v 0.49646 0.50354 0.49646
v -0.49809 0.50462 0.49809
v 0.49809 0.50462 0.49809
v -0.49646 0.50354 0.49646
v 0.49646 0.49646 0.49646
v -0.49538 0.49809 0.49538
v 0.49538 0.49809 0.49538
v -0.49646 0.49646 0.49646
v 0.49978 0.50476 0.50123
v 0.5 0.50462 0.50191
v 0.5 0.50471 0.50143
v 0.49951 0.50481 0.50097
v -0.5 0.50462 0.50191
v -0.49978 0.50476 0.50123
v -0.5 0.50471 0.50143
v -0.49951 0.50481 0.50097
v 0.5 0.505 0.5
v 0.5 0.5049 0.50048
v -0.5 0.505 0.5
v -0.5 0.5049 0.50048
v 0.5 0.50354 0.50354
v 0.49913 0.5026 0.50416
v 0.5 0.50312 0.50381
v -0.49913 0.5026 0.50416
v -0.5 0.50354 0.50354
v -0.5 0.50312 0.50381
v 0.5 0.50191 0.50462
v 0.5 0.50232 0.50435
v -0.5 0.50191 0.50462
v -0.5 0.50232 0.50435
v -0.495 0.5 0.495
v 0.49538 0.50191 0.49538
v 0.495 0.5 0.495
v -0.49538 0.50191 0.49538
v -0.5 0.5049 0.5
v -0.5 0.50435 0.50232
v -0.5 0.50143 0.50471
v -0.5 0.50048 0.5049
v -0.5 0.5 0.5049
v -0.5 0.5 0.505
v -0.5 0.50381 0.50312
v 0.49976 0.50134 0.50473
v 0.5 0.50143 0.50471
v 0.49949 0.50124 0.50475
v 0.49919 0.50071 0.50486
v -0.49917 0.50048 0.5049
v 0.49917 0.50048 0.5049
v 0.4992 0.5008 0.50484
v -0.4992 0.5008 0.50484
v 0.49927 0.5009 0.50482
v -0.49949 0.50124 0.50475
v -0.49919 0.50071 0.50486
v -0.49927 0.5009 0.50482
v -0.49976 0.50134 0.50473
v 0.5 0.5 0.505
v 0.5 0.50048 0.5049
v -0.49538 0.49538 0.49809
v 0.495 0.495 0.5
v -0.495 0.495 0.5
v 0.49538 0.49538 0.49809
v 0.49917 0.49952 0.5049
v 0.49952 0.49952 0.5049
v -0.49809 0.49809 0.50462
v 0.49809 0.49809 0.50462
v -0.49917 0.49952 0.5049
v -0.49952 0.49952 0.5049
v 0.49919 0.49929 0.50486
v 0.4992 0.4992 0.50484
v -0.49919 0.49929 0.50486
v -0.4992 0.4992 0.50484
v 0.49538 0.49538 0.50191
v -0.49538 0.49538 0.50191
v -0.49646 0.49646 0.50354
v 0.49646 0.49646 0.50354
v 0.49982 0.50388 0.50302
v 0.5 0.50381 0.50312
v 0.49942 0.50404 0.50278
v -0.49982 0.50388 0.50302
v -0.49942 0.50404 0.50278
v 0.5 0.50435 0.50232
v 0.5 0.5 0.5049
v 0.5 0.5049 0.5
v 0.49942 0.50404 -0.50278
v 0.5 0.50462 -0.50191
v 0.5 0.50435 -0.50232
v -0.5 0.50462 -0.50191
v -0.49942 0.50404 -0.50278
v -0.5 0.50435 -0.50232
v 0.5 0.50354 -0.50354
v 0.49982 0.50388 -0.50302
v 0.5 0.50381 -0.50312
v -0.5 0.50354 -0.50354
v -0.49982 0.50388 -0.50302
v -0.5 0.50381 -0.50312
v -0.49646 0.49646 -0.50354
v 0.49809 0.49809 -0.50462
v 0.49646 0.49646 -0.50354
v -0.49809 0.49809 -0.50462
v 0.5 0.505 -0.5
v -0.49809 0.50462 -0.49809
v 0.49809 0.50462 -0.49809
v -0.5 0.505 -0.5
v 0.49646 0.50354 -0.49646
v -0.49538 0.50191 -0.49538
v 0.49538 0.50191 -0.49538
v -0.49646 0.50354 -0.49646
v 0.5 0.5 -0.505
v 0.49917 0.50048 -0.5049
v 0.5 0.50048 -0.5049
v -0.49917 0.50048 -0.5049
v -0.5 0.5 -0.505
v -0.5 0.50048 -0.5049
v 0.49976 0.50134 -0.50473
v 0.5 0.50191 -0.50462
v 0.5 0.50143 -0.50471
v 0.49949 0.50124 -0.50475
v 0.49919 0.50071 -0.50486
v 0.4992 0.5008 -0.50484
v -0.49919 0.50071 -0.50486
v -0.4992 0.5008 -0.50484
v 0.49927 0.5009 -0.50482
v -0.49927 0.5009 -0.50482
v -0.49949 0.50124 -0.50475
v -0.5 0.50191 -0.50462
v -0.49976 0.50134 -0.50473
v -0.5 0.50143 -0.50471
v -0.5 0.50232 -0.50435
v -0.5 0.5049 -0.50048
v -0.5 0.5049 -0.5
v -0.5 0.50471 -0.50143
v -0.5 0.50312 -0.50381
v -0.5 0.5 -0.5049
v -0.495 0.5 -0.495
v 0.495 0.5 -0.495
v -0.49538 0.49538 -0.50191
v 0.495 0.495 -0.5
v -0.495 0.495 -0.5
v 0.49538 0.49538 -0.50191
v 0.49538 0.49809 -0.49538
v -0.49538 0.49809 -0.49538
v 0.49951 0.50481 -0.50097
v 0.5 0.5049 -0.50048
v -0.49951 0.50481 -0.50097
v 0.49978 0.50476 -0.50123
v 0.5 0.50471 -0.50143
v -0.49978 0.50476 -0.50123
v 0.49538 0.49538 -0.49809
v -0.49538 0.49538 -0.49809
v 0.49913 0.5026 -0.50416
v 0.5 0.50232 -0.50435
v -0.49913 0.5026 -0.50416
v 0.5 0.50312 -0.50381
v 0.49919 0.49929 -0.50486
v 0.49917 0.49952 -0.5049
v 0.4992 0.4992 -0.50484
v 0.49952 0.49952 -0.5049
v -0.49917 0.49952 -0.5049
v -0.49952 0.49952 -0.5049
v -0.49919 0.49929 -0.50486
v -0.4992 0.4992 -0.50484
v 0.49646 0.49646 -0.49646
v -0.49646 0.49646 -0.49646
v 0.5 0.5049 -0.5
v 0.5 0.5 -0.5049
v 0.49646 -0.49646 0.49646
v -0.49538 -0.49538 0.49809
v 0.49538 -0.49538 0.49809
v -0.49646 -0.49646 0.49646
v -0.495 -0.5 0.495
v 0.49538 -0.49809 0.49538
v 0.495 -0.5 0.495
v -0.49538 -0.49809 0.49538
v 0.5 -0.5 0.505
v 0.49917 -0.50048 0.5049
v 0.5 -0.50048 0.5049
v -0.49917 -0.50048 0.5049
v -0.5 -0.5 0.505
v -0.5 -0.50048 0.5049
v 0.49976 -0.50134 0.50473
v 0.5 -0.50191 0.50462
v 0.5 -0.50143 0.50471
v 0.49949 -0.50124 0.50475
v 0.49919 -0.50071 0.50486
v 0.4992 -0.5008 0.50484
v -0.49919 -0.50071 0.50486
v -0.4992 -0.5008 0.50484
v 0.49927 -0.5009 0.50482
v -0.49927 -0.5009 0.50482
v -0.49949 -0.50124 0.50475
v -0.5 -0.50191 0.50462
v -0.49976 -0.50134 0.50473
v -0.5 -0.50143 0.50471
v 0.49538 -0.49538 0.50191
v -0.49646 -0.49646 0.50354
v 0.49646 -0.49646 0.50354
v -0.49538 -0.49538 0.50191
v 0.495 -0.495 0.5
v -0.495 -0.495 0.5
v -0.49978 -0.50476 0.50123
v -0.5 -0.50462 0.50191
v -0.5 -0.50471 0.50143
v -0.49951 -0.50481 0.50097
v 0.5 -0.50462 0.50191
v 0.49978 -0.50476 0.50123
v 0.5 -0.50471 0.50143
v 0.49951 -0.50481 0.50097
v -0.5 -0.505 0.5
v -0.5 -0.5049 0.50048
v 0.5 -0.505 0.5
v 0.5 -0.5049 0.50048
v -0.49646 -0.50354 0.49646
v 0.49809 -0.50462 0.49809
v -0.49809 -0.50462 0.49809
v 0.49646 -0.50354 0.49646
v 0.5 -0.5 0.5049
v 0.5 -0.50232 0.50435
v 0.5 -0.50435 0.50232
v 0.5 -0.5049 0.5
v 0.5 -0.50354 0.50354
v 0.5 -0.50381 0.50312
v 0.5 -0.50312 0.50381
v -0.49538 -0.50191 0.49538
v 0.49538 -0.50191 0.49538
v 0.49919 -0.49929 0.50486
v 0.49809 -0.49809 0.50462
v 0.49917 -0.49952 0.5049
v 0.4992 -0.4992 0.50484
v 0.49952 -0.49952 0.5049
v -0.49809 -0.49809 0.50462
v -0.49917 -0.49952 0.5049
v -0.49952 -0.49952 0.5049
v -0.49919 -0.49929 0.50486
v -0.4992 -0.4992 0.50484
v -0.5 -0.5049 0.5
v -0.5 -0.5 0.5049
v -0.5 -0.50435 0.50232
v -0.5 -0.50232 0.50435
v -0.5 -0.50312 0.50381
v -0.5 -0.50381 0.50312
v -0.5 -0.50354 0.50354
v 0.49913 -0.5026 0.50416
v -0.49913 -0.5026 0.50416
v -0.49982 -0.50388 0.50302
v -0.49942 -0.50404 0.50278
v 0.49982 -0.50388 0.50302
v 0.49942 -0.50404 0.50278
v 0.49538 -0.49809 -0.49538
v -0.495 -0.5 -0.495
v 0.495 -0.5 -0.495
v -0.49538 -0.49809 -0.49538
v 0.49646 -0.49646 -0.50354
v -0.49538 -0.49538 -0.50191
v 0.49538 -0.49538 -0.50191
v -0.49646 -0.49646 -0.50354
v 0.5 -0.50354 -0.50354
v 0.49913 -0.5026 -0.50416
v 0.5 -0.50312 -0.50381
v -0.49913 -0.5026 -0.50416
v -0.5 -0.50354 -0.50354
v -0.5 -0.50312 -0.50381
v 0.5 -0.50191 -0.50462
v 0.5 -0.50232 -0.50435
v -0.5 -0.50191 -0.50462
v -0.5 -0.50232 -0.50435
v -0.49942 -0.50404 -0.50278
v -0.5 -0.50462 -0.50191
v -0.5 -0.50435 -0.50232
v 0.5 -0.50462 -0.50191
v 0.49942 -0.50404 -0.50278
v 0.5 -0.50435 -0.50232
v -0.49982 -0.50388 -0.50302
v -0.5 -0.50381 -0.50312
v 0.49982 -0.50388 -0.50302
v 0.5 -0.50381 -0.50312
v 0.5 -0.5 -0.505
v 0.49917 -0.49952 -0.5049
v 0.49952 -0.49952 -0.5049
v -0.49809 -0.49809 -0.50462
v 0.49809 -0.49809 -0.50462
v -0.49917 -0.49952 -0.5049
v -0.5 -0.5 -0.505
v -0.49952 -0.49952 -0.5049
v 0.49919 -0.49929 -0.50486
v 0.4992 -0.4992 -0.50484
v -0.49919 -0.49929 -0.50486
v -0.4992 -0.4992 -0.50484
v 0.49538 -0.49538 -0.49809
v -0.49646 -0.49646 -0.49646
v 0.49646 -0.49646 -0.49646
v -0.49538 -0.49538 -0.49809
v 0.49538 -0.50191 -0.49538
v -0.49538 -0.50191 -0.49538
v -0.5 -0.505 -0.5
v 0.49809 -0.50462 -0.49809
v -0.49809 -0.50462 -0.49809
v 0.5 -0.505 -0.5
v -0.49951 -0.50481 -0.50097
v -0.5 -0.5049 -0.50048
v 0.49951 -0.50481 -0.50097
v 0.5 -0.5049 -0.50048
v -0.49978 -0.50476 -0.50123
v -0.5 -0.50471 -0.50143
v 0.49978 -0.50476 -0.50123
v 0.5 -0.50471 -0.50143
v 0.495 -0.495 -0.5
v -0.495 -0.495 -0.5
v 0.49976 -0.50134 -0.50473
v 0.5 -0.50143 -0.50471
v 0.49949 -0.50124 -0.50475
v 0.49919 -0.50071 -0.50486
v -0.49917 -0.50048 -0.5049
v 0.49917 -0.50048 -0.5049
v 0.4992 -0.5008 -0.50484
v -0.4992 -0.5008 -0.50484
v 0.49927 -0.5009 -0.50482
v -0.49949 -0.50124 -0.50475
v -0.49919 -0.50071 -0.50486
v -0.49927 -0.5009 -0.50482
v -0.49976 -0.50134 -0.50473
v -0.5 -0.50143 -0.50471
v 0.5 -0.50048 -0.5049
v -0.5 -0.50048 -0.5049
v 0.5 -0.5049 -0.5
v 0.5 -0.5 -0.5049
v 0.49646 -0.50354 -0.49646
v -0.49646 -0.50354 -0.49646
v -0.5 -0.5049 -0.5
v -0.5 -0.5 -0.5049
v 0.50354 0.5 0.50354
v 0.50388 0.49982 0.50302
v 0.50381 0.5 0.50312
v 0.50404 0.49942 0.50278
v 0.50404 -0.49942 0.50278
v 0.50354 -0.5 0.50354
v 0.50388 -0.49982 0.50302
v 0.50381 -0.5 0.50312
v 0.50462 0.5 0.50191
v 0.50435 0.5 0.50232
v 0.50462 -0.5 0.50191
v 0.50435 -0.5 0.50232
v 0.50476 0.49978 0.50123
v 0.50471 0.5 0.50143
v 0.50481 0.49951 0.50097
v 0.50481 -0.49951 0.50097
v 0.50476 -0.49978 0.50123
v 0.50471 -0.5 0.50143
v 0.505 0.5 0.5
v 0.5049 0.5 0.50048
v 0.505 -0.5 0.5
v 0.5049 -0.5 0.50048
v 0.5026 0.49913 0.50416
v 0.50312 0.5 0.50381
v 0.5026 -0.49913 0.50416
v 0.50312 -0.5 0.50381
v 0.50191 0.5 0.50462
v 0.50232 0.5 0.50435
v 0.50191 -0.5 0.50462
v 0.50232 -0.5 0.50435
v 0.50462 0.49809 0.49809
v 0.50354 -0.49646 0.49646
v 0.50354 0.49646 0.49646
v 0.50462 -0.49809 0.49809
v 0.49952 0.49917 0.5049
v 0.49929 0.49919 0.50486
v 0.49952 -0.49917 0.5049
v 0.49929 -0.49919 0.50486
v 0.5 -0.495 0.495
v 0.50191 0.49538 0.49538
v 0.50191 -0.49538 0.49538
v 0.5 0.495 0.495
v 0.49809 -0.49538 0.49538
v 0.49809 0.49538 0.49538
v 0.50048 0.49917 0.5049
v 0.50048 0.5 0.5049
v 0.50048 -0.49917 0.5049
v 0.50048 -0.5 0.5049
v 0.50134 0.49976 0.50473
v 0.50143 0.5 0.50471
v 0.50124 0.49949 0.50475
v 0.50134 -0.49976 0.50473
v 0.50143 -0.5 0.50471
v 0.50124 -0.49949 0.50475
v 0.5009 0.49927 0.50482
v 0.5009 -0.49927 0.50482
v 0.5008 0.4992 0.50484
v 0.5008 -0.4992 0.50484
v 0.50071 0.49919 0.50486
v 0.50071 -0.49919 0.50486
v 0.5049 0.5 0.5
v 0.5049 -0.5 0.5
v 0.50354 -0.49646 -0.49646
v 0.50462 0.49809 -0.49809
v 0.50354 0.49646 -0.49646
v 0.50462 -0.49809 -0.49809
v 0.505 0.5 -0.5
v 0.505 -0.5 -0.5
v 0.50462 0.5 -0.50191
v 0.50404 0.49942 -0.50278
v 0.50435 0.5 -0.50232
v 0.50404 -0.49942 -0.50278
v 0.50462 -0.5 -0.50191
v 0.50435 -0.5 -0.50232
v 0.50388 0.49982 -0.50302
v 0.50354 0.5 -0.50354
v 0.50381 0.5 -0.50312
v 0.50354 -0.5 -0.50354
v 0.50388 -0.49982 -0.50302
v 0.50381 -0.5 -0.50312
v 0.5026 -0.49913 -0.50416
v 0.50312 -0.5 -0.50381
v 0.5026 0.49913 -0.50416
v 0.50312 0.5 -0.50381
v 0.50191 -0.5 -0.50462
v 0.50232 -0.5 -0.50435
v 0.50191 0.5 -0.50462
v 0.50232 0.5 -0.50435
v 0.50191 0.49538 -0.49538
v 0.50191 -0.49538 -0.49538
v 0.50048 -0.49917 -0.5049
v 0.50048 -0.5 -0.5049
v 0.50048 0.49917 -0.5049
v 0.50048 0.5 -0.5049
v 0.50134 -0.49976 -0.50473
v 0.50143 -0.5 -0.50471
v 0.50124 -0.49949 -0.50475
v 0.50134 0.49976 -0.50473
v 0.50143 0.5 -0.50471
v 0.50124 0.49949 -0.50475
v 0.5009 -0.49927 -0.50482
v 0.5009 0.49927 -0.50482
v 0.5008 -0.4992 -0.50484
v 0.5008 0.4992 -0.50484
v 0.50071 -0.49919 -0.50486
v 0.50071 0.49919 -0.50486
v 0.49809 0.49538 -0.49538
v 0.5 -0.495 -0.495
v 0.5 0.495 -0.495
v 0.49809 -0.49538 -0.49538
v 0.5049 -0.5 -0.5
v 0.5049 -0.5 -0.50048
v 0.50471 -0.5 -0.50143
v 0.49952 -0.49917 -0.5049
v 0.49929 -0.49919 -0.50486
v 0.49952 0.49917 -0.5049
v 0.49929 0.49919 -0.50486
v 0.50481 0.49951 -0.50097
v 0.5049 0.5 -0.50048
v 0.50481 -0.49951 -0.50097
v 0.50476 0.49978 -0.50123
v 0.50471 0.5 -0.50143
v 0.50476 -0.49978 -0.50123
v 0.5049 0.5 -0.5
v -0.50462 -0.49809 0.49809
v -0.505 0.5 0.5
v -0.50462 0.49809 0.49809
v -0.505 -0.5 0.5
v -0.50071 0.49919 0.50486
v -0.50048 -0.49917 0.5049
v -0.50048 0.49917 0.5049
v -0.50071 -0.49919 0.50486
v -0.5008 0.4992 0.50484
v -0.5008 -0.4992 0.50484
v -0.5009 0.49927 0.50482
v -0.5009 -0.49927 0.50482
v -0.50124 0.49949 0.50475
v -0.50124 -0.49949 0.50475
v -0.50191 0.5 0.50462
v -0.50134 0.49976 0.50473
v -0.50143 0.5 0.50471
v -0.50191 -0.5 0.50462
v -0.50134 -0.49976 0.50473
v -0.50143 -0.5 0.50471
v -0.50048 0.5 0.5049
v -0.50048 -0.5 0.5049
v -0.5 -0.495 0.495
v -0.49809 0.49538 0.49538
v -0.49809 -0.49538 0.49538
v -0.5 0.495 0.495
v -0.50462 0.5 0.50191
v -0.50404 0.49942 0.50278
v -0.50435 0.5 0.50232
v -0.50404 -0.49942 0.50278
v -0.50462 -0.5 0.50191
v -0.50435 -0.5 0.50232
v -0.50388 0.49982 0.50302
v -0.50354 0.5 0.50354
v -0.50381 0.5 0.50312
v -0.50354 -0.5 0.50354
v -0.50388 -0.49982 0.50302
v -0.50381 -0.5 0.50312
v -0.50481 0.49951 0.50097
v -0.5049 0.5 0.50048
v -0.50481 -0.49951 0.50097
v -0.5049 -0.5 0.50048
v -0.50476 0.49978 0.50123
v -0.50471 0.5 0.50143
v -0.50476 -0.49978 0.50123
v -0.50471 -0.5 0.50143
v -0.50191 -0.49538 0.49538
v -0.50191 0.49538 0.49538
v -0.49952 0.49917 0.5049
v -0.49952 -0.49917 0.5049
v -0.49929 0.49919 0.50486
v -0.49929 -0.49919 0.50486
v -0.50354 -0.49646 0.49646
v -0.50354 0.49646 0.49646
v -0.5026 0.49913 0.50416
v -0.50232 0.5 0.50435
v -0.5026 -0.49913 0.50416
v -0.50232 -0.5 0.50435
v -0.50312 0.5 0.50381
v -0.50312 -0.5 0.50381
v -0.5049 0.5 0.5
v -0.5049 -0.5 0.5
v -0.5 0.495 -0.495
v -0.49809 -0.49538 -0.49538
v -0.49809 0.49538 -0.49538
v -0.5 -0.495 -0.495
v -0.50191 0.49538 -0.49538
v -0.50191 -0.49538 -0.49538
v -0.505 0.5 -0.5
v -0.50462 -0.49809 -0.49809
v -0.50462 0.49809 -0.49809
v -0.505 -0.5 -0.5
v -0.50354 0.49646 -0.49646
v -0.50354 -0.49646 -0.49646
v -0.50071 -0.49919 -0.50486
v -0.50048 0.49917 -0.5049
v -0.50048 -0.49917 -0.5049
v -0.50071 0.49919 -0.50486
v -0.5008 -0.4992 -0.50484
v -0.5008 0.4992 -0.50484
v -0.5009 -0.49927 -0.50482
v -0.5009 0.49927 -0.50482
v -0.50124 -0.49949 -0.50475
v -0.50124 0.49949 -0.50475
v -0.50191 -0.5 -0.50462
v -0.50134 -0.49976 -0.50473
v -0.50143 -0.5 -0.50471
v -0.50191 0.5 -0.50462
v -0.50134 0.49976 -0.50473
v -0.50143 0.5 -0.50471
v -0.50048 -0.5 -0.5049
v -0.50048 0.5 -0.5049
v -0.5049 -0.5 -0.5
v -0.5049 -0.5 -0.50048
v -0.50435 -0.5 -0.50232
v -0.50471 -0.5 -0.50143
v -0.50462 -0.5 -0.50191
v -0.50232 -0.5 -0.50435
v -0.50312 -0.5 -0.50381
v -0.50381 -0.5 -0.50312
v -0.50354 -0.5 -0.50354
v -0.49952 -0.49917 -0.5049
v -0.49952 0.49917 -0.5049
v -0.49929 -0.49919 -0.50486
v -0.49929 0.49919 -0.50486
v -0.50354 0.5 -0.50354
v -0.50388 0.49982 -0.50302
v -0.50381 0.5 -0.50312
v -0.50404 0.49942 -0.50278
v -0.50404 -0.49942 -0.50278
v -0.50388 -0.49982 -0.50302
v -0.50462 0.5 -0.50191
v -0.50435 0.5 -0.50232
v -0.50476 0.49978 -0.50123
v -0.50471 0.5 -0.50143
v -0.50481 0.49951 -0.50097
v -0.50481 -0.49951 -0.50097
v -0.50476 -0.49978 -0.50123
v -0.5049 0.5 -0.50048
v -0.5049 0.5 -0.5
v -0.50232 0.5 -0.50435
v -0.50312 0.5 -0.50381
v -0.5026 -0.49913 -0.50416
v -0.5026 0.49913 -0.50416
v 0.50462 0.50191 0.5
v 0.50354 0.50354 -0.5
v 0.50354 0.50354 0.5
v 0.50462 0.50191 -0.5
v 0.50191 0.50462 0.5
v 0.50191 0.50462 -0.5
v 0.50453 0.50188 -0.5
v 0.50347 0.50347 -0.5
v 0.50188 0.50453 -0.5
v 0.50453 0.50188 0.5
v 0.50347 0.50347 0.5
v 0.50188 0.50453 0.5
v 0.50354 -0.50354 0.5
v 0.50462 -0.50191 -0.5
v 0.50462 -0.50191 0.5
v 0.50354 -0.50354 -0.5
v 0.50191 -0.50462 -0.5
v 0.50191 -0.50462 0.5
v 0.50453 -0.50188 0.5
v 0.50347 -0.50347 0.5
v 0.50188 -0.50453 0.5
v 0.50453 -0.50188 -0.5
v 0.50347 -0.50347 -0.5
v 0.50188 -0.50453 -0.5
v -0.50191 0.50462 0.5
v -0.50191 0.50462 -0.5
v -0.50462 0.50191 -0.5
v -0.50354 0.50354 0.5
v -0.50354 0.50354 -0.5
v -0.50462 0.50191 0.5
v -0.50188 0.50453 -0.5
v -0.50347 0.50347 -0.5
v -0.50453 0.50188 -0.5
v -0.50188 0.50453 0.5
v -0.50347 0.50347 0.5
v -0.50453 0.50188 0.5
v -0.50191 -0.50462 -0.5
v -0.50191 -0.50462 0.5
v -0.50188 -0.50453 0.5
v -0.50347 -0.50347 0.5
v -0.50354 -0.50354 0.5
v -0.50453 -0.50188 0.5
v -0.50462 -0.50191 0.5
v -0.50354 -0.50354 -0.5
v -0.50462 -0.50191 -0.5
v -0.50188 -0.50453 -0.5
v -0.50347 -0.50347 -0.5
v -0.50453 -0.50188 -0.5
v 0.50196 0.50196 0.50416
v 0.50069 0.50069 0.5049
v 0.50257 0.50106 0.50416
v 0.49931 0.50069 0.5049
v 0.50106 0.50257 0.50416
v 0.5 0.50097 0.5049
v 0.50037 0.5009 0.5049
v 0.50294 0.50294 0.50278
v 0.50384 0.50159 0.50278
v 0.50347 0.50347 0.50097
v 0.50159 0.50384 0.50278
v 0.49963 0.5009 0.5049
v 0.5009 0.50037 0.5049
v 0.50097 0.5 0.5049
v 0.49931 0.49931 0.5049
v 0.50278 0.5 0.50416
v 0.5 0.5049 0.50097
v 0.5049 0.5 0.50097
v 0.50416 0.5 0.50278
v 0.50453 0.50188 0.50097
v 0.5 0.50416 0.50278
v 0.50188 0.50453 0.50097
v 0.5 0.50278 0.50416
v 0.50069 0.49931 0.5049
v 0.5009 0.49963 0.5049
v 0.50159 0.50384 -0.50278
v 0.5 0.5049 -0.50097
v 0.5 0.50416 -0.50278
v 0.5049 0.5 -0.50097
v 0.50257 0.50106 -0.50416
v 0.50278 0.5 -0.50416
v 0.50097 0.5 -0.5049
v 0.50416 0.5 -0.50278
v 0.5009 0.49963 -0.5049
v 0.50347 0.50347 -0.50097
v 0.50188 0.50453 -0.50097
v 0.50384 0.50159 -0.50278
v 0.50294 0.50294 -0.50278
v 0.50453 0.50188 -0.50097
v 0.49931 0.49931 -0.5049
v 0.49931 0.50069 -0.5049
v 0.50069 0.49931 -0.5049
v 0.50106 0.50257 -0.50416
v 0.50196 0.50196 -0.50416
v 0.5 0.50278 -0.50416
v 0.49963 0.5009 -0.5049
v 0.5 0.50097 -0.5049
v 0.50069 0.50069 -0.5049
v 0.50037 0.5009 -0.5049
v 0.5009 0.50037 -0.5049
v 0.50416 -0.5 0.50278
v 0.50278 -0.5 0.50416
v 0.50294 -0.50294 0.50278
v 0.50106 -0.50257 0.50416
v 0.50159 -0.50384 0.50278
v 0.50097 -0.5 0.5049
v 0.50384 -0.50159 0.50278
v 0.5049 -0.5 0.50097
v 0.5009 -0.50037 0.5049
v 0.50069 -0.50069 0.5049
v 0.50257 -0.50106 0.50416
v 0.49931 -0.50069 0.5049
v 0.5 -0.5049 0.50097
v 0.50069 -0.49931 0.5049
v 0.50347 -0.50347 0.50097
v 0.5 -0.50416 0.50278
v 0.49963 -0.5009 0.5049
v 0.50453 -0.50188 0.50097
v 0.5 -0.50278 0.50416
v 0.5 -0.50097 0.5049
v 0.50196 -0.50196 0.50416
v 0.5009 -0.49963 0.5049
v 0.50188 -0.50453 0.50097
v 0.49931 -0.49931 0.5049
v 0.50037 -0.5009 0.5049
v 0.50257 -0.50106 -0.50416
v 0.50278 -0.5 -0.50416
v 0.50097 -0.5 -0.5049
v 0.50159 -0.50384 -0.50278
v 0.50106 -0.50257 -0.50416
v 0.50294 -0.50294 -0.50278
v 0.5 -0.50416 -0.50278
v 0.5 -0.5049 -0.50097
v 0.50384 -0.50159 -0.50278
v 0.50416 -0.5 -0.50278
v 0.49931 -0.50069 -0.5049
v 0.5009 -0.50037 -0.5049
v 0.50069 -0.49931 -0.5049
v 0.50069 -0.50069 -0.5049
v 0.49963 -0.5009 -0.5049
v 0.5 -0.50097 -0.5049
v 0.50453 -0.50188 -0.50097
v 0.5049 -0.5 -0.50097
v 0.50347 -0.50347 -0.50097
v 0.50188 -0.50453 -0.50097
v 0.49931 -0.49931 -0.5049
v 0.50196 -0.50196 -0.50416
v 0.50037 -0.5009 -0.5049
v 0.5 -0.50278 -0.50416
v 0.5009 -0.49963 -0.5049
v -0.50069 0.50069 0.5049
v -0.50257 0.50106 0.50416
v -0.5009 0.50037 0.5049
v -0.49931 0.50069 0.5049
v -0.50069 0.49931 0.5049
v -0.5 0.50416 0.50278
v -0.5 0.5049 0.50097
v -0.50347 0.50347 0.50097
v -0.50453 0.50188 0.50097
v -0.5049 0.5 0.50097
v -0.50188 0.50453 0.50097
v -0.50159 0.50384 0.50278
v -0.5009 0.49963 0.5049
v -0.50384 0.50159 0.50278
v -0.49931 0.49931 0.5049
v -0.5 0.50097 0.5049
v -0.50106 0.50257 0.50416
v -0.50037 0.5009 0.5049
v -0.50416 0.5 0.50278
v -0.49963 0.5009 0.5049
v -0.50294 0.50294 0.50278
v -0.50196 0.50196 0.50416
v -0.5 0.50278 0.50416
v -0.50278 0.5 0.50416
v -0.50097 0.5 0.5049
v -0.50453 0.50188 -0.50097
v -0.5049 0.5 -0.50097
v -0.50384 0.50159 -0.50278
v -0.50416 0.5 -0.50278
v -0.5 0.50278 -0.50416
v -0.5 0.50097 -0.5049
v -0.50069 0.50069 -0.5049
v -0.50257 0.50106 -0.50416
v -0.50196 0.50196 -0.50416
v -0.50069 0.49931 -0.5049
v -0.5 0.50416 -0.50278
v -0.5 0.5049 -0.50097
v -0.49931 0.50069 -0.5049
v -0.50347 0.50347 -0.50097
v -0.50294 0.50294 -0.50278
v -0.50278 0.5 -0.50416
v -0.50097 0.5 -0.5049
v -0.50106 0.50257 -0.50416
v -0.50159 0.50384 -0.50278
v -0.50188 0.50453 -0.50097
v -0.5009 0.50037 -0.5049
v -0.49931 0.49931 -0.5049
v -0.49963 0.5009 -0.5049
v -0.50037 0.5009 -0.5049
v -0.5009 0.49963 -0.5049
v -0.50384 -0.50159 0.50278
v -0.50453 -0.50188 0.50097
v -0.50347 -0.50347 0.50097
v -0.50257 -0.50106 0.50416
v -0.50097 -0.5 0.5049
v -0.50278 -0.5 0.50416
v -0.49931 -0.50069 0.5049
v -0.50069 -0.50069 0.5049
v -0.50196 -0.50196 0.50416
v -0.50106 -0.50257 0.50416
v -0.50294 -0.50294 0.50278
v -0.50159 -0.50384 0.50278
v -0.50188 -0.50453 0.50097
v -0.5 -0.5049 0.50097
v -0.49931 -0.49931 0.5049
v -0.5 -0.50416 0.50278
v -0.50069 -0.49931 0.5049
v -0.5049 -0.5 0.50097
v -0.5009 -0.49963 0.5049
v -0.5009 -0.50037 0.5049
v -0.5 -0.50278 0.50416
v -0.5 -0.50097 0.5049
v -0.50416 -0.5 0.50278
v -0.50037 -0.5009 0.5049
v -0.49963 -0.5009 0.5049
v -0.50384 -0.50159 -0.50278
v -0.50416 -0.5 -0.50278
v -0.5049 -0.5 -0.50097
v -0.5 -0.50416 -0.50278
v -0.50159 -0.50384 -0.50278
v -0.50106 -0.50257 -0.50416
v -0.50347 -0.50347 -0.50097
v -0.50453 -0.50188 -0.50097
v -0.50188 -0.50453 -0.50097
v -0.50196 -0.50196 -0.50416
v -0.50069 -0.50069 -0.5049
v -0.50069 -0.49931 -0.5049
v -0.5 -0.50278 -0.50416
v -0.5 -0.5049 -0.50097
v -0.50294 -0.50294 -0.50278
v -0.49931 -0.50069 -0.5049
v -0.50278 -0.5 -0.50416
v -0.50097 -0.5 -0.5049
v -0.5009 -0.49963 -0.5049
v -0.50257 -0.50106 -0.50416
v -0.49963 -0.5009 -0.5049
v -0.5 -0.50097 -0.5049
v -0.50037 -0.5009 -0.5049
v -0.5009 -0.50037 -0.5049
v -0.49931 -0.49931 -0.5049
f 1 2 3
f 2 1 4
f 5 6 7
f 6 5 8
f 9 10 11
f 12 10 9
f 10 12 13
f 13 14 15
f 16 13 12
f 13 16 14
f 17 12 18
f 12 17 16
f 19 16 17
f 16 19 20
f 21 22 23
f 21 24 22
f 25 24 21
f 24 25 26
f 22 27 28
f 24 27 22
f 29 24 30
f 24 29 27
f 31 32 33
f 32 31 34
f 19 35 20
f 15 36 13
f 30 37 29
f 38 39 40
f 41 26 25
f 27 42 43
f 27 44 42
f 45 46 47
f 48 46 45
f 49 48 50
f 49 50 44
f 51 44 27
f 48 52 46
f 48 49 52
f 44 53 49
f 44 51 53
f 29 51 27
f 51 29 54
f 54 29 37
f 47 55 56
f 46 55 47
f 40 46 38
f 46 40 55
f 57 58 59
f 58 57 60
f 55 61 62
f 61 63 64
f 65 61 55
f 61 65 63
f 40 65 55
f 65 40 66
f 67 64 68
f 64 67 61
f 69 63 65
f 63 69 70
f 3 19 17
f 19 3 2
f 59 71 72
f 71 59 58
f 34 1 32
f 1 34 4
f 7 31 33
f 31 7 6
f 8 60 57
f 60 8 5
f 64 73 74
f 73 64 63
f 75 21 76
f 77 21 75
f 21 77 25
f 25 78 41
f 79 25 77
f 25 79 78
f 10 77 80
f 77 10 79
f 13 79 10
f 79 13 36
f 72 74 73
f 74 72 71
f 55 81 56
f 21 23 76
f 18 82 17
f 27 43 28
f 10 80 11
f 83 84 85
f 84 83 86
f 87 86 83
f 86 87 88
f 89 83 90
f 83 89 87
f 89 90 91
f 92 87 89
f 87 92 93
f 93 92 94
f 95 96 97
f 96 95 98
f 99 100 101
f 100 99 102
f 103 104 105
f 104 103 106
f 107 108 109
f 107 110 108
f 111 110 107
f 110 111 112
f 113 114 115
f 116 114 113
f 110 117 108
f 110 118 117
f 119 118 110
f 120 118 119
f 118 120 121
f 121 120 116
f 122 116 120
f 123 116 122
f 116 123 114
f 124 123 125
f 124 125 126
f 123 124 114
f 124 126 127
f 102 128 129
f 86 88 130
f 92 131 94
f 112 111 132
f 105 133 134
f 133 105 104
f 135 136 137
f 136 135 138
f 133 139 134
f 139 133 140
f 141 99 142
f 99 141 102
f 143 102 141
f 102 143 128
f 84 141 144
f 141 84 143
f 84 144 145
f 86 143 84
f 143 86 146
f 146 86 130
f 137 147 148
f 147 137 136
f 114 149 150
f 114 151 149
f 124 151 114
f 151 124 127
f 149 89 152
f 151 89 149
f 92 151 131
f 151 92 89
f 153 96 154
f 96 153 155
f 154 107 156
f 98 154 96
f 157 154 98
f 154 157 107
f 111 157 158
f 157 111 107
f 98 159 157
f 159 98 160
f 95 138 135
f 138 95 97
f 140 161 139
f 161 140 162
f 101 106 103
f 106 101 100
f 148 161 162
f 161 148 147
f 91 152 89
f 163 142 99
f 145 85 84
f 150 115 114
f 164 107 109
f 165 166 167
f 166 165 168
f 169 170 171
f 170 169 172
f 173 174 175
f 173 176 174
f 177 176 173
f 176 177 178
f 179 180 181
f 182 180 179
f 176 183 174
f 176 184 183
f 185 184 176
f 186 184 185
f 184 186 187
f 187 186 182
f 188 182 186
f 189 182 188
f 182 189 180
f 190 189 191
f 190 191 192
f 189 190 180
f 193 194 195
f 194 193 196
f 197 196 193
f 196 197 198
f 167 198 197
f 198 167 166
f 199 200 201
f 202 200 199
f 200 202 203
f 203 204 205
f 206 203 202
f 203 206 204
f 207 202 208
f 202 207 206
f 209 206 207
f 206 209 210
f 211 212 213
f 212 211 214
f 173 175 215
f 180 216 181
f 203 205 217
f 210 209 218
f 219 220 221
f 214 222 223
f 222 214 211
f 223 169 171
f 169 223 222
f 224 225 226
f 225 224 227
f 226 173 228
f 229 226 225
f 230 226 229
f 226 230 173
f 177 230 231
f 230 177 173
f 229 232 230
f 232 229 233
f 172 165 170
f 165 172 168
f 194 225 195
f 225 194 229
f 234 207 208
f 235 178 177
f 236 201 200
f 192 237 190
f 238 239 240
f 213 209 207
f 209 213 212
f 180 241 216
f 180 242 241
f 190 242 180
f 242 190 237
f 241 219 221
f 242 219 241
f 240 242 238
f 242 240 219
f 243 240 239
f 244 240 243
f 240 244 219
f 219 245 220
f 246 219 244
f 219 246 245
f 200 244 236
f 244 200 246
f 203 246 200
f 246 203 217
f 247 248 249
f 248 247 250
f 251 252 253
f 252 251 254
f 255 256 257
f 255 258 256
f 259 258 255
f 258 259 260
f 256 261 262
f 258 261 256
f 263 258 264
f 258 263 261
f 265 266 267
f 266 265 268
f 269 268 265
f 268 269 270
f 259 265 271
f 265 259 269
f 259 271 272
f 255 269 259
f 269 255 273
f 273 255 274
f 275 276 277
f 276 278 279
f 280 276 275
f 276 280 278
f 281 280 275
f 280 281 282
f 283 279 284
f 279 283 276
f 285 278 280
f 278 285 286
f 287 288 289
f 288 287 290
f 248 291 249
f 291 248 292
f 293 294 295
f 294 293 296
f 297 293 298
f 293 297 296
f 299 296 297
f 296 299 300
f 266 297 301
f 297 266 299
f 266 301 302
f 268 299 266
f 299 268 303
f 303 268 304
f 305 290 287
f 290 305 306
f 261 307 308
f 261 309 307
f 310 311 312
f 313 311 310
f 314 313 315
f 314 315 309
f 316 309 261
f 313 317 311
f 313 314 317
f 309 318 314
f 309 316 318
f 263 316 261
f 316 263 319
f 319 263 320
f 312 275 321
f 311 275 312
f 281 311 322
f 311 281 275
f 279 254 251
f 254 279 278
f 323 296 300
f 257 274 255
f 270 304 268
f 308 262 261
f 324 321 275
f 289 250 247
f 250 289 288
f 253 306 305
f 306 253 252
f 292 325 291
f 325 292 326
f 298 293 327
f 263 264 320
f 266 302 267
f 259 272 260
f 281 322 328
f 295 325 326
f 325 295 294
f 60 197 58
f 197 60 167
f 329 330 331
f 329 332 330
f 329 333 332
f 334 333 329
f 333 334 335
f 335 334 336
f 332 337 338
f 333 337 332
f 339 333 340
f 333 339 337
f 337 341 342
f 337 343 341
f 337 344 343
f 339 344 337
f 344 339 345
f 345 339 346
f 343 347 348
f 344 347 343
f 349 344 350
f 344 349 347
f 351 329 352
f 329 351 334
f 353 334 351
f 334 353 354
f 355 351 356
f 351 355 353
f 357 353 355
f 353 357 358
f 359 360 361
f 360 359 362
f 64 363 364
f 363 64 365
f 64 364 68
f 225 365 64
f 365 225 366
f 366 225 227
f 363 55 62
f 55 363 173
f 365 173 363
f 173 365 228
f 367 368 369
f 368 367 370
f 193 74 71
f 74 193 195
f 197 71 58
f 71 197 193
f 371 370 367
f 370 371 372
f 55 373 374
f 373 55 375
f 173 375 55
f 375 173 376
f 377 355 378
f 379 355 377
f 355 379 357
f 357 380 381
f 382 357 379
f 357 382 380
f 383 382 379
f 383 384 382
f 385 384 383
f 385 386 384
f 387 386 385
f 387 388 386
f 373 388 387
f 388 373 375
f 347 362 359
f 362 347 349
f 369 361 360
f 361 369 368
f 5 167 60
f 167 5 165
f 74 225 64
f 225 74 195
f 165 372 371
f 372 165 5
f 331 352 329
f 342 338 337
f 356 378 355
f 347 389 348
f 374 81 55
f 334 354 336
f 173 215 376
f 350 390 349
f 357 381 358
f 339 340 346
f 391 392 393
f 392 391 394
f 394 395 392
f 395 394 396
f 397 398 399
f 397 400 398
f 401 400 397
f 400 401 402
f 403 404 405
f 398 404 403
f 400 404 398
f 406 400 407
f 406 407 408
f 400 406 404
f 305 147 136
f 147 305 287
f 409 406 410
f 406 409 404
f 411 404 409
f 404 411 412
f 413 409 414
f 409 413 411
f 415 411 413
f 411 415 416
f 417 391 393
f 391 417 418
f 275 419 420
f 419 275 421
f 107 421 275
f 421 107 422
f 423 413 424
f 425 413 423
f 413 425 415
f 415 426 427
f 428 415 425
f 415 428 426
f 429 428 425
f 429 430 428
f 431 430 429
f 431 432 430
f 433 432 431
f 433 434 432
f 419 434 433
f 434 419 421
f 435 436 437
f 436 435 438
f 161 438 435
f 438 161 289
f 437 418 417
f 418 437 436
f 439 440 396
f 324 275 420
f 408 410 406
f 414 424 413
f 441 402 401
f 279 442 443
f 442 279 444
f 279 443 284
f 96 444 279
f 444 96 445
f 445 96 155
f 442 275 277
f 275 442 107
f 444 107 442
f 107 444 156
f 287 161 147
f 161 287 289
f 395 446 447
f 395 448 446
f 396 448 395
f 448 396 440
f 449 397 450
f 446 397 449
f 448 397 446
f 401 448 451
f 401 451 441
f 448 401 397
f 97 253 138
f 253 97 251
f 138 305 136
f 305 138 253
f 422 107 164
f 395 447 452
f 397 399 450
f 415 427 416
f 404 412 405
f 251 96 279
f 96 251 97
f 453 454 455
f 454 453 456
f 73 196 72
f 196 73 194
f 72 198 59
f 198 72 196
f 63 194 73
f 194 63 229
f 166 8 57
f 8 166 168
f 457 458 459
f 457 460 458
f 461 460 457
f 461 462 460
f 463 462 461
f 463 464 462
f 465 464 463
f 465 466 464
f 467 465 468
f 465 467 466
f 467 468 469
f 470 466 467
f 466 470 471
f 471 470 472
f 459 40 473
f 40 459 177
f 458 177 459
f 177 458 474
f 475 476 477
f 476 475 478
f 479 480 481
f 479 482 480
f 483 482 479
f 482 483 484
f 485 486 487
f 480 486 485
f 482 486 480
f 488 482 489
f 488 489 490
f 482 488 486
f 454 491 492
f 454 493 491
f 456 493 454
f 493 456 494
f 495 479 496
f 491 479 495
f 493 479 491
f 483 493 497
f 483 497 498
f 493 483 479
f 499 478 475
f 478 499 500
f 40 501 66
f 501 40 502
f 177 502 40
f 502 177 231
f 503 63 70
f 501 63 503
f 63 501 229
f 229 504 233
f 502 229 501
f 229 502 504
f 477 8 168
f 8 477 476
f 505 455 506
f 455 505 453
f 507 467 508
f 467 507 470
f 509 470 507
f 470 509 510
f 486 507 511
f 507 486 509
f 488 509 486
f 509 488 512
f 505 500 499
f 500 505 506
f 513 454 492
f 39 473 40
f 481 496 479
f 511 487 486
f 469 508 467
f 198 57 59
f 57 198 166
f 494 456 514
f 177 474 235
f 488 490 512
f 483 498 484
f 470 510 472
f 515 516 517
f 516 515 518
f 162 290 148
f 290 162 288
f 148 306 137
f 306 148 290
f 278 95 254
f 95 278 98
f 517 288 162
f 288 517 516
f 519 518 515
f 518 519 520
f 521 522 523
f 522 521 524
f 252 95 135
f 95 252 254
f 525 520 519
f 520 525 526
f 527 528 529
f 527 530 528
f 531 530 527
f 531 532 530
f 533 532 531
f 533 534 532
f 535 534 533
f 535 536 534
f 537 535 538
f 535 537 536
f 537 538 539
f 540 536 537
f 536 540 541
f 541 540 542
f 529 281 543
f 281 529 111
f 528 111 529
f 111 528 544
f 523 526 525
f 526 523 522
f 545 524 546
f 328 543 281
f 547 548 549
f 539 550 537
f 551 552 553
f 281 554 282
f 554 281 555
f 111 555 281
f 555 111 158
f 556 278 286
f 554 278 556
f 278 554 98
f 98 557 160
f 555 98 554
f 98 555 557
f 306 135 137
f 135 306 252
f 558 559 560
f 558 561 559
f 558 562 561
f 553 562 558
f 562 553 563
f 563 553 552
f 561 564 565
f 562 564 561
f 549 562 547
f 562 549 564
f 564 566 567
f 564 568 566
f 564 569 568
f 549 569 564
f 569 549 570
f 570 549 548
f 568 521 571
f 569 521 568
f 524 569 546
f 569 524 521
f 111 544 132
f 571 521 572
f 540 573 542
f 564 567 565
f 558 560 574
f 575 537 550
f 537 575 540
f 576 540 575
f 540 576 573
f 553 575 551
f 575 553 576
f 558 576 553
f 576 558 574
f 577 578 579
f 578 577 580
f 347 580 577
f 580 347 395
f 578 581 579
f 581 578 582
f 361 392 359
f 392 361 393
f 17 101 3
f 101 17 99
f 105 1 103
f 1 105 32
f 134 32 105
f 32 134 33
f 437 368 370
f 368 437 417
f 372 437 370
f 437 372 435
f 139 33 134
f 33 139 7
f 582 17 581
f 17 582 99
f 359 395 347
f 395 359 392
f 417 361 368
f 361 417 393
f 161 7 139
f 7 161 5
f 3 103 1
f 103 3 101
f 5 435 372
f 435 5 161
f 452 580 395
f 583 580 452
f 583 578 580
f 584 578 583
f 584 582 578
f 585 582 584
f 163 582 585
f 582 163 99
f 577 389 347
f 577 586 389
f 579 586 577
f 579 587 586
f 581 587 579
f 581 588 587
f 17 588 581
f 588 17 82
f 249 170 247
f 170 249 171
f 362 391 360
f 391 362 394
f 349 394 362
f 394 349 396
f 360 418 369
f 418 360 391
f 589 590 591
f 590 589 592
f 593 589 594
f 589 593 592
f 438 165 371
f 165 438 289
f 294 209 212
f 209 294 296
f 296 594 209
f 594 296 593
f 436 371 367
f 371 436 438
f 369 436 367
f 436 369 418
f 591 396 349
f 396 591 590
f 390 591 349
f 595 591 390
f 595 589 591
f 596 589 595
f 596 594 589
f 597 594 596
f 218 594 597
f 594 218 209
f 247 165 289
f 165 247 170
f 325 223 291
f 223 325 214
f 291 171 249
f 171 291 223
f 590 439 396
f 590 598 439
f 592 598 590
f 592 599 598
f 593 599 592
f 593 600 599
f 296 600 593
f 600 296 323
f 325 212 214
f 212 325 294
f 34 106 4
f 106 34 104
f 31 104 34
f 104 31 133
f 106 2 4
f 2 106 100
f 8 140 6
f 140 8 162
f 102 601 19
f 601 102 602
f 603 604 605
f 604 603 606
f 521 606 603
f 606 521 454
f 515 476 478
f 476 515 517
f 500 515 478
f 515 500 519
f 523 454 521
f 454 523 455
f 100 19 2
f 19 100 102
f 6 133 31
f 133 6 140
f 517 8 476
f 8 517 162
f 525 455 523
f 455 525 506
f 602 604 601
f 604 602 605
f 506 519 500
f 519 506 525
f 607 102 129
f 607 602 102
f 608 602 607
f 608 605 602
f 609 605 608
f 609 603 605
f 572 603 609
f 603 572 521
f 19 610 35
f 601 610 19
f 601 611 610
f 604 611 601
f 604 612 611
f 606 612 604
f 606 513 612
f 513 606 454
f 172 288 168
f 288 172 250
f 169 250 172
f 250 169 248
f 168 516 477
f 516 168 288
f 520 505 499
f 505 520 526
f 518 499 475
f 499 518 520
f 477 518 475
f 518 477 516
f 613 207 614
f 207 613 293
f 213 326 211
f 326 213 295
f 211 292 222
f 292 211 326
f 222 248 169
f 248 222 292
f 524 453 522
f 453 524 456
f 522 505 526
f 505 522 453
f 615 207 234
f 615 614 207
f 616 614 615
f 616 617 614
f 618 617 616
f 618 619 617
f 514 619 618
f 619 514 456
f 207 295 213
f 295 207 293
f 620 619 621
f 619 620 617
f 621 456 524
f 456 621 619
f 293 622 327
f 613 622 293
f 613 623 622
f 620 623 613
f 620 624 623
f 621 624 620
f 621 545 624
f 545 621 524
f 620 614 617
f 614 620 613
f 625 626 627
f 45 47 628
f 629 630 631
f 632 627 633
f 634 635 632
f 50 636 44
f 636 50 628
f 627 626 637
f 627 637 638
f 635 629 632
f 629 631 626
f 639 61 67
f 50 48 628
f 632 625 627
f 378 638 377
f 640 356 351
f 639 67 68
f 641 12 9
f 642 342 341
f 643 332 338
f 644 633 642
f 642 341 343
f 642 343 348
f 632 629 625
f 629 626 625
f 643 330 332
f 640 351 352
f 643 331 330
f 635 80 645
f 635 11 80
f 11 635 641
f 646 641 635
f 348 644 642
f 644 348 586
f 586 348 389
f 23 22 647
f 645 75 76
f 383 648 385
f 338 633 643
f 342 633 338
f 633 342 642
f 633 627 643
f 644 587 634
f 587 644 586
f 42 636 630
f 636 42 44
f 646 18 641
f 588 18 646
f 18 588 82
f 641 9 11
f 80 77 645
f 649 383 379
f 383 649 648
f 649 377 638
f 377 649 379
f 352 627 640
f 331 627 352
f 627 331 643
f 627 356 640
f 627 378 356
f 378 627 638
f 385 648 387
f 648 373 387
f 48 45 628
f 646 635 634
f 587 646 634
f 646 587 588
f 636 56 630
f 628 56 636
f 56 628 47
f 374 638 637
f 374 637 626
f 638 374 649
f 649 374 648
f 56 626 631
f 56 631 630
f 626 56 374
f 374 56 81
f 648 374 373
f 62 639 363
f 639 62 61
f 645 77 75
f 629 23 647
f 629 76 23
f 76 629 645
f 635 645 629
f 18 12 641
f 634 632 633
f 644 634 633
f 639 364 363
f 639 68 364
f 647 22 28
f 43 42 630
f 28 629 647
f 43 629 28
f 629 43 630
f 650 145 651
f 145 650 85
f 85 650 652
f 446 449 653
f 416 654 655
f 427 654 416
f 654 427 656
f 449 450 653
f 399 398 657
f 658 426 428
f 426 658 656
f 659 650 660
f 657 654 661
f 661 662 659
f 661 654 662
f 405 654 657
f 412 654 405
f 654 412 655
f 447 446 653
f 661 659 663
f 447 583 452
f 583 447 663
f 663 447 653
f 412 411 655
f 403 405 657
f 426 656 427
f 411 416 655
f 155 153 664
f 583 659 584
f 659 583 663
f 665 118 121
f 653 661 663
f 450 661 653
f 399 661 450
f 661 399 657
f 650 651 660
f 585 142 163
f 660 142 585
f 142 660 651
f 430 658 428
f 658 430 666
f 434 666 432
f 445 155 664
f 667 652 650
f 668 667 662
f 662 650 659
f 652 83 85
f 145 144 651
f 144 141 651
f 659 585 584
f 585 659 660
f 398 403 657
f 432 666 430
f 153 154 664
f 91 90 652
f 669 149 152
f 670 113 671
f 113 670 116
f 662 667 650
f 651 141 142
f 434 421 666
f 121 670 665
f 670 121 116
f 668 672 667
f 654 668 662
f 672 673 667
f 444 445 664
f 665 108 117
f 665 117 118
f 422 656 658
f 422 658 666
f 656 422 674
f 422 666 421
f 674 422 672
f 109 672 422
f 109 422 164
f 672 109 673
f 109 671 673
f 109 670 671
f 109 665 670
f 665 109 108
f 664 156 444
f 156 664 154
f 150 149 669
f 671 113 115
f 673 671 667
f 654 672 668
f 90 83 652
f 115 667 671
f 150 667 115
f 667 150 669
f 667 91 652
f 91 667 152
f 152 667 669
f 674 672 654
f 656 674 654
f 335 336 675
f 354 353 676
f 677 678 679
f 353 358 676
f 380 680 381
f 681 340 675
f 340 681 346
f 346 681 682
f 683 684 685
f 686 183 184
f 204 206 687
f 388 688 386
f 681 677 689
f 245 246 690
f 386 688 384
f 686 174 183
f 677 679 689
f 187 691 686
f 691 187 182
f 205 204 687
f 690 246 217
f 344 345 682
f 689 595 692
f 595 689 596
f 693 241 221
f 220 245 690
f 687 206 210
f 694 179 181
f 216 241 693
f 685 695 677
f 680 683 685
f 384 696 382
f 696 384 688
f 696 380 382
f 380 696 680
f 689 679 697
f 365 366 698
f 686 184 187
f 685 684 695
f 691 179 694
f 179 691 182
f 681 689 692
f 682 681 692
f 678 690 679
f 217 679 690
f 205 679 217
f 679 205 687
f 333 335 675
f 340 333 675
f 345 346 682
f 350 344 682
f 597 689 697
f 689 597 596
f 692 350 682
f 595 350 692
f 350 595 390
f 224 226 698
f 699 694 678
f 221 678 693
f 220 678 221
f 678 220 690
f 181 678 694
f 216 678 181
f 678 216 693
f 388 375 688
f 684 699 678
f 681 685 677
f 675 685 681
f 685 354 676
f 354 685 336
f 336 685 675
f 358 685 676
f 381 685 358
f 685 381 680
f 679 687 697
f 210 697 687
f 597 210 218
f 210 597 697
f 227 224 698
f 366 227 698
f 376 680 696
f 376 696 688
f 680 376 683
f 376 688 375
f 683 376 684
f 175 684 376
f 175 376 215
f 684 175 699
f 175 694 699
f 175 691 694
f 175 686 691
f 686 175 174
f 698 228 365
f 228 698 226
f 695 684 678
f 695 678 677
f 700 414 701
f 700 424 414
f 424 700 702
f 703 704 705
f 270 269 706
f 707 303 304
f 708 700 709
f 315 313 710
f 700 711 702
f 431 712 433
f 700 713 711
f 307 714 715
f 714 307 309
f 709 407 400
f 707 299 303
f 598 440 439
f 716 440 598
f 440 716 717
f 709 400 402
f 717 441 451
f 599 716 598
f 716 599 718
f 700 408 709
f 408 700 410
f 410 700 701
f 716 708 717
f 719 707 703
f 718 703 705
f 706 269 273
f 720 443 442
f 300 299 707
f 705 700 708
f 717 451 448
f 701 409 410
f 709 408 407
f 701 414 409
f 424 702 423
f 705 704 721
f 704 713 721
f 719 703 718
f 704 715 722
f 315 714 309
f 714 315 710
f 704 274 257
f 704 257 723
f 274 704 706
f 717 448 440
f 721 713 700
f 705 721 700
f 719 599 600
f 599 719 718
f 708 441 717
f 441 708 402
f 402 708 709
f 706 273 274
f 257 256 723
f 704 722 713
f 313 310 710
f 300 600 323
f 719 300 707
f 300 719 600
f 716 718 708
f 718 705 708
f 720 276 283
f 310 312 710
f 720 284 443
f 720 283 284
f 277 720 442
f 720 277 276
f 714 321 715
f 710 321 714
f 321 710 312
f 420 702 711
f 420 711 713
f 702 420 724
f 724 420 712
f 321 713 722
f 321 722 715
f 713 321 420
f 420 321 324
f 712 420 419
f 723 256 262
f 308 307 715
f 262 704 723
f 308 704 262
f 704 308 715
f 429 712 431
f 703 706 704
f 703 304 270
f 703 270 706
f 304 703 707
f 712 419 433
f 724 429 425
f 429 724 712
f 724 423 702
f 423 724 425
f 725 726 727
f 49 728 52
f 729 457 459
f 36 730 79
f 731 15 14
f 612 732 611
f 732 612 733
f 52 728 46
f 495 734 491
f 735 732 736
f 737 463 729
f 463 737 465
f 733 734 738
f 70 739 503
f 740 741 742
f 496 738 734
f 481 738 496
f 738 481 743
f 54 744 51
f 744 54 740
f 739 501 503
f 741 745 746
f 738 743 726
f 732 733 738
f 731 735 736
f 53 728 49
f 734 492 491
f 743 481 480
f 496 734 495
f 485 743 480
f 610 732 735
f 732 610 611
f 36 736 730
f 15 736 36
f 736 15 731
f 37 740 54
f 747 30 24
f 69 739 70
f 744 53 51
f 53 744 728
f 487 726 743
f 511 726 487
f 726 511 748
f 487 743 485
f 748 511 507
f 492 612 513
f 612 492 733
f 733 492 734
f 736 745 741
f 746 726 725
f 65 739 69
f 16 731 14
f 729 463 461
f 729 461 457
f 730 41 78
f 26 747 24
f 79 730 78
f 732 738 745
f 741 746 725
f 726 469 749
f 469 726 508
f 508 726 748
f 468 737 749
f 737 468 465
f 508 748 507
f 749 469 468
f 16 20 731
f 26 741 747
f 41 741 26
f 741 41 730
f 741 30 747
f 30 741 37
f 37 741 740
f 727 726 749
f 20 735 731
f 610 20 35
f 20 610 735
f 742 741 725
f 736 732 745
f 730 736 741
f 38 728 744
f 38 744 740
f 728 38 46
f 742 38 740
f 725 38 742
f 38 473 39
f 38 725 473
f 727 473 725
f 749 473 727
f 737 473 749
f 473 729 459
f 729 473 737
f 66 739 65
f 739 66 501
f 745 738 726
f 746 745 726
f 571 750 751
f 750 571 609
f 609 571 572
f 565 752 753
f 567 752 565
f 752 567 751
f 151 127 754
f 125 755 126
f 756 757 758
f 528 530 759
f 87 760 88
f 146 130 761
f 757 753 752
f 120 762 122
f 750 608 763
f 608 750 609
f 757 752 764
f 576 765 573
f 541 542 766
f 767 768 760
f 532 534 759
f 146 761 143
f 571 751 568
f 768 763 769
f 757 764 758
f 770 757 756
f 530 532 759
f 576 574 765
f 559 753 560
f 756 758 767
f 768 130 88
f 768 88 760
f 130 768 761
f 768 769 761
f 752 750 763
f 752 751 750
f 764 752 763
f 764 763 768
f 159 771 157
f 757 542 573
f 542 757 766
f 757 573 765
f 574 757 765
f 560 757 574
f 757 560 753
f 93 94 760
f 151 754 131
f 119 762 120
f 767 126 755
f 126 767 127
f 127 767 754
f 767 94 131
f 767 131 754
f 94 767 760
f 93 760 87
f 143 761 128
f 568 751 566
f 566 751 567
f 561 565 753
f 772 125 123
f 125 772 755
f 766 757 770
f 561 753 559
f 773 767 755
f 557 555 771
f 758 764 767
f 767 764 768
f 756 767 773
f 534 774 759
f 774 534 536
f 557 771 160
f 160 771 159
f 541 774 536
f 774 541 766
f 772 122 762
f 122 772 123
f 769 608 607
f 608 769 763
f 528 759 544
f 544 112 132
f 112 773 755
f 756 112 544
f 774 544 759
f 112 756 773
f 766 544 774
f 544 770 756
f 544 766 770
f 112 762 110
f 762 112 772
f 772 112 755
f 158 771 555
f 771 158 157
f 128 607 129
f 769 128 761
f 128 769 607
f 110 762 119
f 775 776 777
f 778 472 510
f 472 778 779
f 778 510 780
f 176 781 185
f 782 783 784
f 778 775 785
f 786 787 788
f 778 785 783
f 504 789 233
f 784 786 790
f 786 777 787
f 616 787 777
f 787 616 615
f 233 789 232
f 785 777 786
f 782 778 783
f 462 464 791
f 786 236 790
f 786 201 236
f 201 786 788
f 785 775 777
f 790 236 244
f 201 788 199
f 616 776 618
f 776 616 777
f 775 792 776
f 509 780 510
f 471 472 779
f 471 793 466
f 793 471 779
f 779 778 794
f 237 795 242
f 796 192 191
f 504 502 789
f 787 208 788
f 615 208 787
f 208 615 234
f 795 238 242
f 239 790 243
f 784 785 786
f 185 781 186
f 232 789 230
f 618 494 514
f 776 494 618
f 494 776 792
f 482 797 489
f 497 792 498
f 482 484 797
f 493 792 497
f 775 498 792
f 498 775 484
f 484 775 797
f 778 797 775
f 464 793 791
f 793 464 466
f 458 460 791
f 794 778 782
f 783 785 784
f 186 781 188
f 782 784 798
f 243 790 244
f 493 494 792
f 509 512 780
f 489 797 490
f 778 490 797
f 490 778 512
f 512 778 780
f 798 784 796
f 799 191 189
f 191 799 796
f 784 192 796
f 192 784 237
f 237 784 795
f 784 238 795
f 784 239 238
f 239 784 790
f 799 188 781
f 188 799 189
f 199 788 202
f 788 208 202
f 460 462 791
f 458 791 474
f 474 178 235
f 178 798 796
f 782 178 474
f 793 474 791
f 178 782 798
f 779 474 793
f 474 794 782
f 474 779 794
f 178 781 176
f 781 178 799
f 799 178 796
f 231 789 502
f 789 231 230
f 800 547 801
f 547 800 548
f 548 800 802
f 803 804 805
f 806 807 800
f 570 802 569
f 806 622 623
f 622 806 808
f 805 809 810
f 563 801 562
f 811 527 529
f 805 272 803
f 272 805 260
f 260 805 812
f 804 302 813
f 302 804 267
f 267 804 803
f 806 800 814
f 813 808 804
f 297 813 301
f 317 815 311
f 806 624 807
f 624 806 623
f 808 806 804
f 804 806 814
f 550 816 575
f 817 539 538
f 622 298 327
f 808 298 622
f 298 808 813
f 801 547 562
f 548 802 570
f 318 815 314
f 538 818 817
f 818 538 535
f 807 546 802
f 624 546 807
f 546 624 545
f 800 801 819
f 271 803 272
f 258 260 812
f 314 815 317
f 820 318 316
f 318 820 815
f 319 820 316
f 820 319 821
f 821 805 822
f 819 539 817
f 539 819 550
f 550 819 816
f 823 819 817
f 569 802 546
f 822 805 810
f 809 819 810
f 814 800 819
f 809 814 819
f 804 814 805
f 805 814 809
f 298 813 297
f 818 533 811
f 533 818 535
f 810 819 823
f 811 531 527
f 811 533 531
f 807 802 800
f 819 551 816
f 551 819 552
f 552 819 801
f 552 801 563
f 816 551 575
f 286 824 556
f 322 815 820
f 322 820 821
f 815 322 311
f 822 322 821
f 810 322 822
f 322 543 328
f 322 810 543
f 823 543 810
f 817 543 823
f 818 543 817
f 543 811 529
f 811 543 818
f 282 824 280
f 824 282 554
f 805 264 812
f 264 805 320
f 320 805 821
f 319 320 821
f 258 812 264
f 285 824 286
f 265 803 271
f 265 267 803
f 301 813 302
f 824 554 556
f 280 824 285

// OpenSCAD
$fn=16;
size=1;
diameter=0.01;

// Edges
// X
translate([0,0.5,0.5])
rotate([0,90,0])
cylinder(d=diameter,h=size,center=true);
translate([0,0.5,-0.5])
rotate([0,90,0])
cylinder(d=diameter,h=size,center=true);
translate([0,-0.5,0.5])
rotate([0,90,0])
cylinder(d=diameter,h=size,center=true);
translate([0,-0.5,-0.5])
rotate([0,90,0])
cylinder(d=diameter,h=size,center=true);
// Y
translate([0.5,0,0.5])
rotate([90,0,0])
cylinder(d=diameter,h=size,center=true);
translate([0.5,0,-0.5])
rotate([90,0,0])
cylinder(d=diameter,h=size,center=true);
translate([-0.5,0,0.5])
rotate([90,0,0])
cylinder(d=diameter,h=size,center=true);
translate([-0.5,0,-0.5])
rotate([90,0,0])
cylinder(d=diameter,h=size,center=true);
// Z
translate([0.5,0.5,0])
cylinder(d=diameter,h=size,center=true);
translate([0.5,-0.5,0])
cylinder(d=diameter,h=size,center=true);
translate([-0.5,0.5,0])
cylinder(d=diameter,h=size,center=true);
translate([-0.5,-0.5,0])
cylinder(d=diameter,h=size,center=true);

// Vertices
translate([0.5,0.5,0.5])
sphere(d=diameter);
translate([0.5,0.5,-0.5])
sphere(d=diameter);
translate([0.5,-0.5,0.5])
sphere(d=diameter);
translate([0.5,-0.5,-0.5])
sphere(d=diameter);
translate([-0.5,0.5,0.5])
sphere(d=diameter);
translate([-0.5,0.5,-0.5])
sphere(d=diameter);
translate([-0.5,-0.5,0.5])
sphere(d=diameter);
translate([-0.5,-0.5,-0.5])
sphere(d=diameter);
